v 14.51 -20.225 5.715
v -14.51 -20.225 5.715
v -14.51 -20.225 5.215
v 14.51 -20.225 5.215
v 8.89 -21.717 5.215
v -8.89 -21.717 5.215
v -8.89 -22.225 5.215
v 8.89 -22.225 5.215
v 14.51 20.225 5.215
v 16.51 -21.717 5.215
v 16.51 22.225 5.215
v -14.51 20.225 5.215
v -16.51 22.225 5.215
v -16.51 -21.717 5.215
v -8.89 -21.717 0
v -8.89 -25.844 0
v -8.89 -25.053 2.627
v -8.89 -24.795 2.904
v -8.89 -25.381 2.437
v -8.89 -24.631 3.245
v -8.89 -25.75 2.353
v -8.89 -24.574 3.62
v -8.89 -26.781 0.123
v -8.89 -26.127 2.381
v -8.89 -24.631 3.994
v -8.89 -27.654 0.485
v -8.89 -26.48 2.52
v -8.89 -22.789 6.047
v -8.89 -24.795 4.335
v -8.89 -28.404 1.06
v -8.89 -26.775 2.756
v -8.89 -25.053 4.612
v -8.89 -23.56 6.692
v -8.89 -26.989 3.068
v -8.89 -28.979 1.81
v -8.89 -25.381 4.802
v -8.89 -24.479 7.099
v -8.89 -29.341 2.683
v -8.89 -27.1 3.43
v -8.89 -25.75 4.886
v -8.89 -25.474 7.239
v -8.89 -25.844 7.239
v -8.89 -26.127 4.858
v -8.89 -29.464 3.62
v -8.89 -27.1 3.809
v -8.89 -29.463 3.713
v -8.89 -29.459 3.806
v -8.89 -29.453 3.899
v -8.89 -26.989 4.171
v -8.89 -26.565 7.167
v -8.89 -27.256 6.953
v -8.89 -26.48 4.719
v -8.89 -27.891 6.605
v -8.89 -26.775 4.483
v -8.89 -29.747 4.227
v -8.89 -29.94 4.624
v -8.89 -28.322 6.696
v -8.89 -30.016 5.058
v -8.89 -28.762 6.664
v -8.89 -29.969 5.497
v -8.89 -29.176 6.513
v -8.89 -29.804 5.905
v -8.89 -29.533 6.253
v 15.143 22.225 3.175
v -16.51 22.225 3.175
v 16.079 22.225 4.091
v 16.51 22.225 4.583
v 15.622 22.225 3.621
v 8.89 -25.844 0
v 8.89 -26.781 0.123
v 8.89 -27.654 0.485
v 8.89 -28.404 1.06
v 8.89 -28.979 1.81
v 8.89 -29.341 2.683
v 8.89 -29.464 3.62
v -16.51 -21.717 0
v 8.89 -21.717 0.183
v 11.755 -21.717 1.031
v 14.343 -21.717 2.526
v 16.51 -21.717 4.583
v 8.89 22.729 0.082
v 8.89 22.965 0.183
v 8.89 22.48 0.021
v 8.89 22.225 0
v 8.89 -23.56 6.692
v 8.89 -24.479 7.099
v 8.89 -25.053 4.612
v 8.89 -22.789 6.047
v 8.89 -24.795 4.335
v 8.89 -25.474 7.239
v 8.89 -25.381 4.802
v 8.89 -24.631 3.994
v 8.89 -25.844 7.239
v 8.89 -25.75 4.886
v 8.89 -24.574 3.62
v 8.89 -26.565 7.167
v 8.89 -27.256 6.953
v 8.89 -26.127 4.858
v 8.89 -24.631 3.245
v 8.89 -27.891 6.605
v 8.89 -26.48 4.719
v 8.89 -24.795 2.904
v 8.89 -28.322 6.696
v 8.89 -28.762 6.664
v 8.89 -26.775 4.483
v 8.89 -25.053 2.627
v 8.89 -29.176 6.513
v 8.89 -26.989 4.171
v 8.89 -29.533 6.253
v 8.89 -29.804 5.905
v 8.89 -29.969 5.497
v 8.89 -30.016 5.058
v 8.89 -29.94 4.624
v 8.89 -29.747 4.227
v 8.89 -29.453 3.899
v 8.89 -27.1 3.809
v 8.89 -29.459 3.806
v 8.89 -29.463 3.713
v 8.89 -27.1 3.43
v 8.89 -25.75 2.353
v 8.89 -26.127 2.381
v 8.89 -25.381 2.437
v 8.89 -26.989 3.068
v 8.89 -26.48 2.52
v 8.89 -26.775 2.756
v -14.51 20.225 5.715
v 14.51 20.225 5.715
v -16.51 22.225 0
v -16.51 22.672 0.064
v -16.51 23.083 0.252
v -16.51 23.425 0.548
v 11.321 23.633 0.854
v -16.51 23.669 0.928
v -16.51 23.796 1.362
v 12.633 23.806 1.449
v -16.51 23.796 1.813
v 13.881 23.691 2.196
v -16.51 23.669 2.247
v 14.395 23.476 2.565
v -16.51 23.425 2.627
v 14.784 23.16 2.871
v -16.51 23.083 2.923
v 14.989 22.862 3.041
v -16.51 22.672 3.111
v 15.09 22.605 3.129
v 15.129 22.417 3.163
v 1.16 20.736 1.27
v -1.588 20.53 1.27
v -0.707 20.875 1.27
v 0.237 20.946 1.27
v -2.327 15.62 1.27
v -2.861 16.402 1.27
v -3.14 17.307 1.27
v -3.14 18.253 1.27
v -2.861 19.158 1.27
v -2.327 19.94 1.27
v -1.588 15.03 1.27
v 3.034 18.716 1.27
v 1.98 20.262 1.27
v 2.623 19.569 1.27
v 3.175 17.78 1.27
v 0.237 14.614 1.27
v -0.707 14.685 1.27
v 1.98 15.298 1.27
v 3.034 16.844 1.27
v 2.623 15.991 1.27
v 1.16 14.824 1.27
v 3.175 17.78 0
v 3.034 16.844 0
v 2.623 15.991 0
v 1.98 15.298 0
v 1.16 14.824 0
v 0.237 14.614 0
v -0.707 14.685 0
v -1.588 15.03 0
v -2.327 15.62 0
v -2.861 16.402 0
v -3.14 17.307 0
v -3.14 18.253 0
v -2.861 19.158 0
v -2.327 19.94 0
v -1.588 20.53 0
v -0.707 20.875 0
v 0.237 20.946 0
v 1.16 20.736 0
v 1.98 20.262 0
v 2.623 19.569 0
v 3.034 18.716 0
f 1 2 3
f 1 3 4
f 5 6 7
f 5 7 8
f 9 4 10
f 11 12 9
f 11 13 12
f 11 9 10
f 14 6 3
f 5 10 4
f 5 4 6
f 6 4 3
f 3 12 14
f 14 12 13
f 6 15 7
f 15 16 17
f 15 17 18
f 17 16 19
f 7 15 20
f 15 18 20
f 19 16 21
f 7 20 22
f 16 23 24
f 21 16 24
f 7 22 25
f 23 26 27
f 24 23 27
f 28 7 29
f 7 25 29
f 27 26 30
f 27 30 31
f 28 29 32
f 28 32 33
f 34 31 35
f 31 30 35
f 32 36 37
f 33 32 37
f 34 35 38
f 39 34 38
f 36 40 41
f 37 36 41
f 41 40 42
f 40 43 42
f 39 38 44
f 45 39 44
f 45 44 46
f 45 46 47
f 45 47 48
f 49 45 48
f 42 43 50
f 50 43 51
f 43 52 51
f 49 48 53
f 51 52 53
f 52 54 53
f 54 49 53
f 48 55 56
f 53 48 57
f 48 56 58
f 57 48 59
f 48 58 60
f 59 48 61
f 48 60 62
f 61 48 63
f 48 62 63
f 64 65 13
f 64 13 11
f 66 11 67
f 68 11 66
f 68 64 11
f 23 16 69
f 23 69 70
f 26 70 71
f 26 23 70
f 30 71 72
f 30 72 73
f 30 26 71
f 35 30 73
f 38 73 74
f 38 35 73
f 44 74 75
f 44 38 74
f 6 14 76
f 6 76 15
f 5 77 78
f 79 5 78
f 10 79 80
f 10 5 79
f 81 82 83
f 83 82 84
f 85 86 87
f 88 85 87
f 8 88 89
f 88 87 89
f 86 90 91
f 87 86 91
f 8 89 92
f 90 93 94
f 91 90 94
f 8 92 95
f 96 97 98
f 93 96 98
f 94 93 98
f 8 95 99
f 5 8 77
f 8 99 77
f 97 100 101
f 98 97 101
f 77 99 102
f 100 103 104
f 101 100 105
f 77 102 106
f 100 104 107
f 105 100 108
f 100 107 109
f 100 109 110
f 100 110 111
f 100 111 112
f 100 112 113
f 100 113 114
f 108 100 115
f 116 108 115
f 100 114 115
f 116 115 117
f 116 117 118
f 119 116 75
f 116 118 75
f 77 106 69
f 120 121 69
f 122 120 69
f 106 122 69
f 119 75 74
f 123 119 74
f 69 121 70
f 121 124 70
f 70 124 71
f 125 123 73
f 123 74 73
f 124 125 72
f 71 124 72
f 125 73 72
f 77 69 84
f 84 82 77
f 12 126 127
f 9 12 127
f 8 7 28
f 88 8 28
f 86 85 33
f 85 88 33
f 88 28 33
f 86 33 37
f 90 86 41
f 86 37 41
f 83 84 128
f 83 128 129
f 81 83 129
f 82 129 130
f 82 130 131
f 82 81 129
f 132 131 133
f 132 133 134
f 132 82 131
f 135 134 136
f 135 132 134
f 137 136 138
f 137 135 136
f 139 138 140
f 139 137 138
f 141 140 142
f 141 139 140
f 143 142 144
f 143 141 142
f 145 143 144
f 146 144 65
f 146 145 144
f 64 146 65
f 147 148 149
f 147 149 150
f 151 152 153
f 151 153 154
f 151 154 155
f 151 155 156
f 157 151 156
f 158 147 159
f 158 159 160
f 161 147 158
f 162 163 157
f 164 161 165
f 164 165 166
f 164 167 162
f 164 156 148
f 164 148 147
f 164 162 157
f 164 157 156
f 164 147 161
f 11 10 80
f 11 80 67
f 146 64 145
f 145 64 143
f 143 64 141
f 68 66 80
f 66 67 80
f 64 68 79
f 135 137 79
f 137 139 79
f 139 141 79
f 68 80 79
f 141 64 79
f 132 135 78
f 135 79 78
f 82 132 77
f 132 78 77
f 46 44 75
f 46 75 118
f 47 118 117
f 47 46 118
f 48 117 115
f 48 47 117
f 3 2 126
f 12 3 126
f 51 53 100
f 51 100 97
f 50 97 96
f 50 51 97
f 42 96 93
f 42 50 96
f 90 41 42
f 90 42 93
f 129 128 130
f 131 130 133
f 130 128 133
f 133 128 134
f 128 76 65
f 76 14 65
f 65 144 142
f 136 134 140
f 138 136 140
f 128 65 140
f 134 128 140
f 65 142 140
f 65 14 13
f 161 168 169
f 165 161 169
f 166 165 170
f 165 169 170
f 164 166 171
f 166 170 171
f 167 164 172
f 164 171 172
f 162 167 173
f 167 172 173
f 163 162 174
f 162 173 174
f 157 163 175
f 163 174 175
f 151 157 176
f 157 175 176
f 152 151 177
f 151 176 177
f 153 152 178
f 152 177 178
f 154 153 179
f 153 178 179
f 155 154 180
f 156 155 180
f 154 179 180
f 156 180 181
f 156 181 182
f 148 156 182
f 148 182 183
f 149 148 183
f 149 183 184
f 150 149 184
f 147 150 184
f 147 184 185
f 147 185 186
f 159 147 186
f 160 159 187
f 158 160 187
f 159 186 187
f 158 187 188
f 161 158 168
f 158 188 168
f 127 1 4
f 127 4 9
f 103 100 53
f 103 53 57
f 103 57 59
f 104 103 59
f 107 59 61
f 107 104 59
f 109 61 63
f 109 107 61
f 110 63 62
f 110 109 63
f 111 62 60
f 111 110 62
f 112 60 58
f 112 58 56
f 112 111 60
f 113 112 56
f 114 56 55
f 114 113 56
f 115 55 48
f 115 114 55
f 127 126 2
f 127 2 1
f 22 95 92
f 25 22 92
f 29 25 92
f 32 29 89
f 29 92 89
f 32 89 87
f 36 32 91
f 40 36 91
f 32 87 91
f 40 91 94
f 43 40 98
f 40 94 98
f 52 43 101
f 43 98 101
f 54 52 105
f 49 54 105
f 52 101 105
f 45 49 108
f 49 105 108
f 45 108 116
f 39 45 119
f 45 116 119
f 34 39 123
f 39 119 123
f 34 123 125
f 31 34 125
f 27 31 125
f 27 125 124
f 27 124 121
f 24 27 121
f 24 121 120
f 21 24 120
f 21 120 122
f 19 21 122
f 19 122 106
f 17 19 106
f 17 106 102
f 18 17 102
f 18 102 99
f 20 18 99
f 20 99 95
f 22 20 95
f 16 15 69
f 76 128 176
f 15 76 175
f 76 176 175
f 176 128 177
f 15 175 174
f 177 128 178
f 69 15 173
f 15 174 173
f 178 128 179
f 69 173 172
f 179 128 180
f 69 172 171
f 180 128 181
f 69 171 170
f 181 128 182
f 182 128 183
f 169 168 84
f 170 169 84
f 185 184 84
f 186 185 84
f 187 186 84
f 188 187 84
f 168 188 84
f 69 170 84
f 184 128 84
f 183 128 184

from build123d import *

# Parameters (mm, degrees)
F0_W         = 33.02
F0_H         = 44.45
F1_DEPTH     = 5.715
F2_W         = 17.78
F2_H         = 7.239
F3_DEPTH     = 7.239
F4_R         = 1.27
F5_DEPTH     = 19.05
F6_W         = 33.02
F6_H         = 44.45
F6_W_2       = 29.02
F6_H_2       = 40.45
F7_DEPTH     = 0.5
F9_DEPTH     = 33.02
F10_T1_DEPTH = 35.8775
F10_T3_DEPTH = 34.0243528649
F11_R        = 3.175
F12_DEPTH    = 1.27
F14_DEPTH    = 17.78
F15_W        = 7.62
F15_H        = 5.215
F16_DEPTH    = 0.508
F19_DEPTH    = 76.2


# Not quite as in the source:
# - a fillet or chamfer that OpenCascade refuses, or shapes differently, is made with other operations: its cross-section is extruded or revolved along the edge and cut away or added


with BuildPart() as f1:
    # F0 (on Top) → F1 (new body)
    with BuildSketch(Plane.XY):
        Rectangle(F0_W, F0_H)
    extrude(amount=F1_DEPTH)

    # F2 (on face) → F3 (join)
    with BuildSketch(Plane.XZ.offset(22.225)):
        with Locations((0, 3.6195)):
            Rectangle(F2_W, F2_H)
    extrude(amount=F3_DEPTH)

    # F4 (on face) → F5 (cut)
    with BuildSketch(Plane.YZ.offset(8.89)):
        with Locations((-25.8445, 3.6195)):
            Circle(F4_R)
    extrude(amount=-F5_DEPTH, mode=Mode.SUBTRACT)

    # F6 (on face) → F7 (cut)
    with BuildSketch(Plane.XY.offset(5.715)):
        Rectangle(F6_W, F6_H)
        Rectangle(F6_W_2, F6_H_2, mode=Mode.SUBTRACT)
    extrude(amount=-F7_DEPTH, mode=Mode.SUBTRACT)

    # F8 (on face) → F9 (join, through all)
    with BuildSketch(Plane.YZ.offset(16.51)):
        with BuildLine():
            Line((22.225, 3.175), (22.225, 0))
            ThreePointArc((22.225, 0), (23.8125, 1.5875), (22.225, 3.175))
        make_face()
    extrude(amount=-F9_DEPTH)

    # F10: fillet of radius 3.6195 on 3 edges, made by hand

    # F10_s2 → F10_t1 (cut)
    with BuildSketch(Plane.YZ.offset(-17.93875)):
        with BuildLine():
            ThreePointArc((-29.464, 3.6195), (-28.4038729945, 6.1788729945), (-25.8445, 7.239))
            Line((-25.8445, 7.239), (-25.8445, 7.31139))
            Line((-25.8445, 7.31139), (-29.53639, 7.31139))
            Line((-29.53639, 7.31139), (-29.53639, 3.6195))
            Line((-29.53639, 3.6195), (-29.464, 3.6195))
        make_face()
        with BuildLine():
            ThreePointArc((-25.8445, 0), (-28.4038729945, 1.0601270055), (-29.464, 3.6195))
            Line((-29.464, 3.6195), (-29.53639, 3.6195))
            Line((-29.53639, 3.6195), (-29.53639, -0.07239))
            Line((-29.53639, -0.07239), (-25.8445, -0.07239))
            Line((-25.8445, -0.07239), (-25.8445, 0))
        make_face()
    extrude(amount=F10_T1_DEPTH, mode=Mode.SUBTRACT)

    # F10_s4 → F10_t3 (cut)
    with BuildSketch(Plane.YZ.offset(-17.0121764325)):
        with BuildLine():
            ThreePointArc((-22.225, 5.215), (-23.5599912664, 6.6916077862), (-25.473870573, 7.239))
            Line((-25.473870573, 7.239), (-25.473870573, 7.31139))
            Line((-25.473870573, 7.31139), (-22.225, 7.31139))
            Line((-22.225, 7.31139), (-22.15261, 7.239))
            ThreePointArc((-22.15261, 7.239), (-22.15261, 6.227), (-22.1600225885, 5.24691))
            Line((-22.1600225885, 5.24691), (-22.225, 5.215))
        make_face()
    extrude(amount=F10_T3_DEPTH, mode=Mode.SUBTRACT)

    # F11 (on face) → F12 (cut)
    with BuildSketch(Plane(origin=(0, 0, 0), x_dir=(1, 0, 0), z_dir=(0, 0, -1))):
        with Locations((0, -17.78)):
            Circle(F11_R)
    extrude(amount=-F12_DEPTH, mode=Mode.SUBTRACT)

    # F13 (on face) → F14 (join)
    with BuildSketch(Plane.YZ.offset(8.89)):
        with BuildLine():
            ThreePointArc((-29.4532143561, 3.8987148746), (-28.979078949, 5.42925), (-27.8906643526, 6.6051308701))
            ThreePointArc((-27.8906643526, 6.6051308701), (-29.8039681461, 5.9055), (-29.4532143561, 3.8987148746))
        make_face()
    extrude(amount=-F14_DEPTH)

    # F15 (on face) → F16 (cut)
    with BuildSketch(Plane.XZ.offset(22.225)):
        with Locations((-12.7, 2.6075)):
            Rectangle(F15_W, F15_H)
        with Locations((12.7, 2.6075)):
            Rectangle(F15_W, F15_H)
    extrude(amount=-F16_DEPTH, mode=Mode.SUBTRACT)

    # F18 (on face) → F19 (cut)
    with BuildSketch(Plane.XZ.offset(21.717)):
        with BuildLine():
            ThreePointArc((16.51, 4.5832213708), (13.0932734681, 1.702037729), (8.89, 0.182915771))
            Line((8.89, 0.182915771), (8.89, 0))
            Line((8.89, 0), (16.51, 0))
            Line((16.51, 0), (16.51, 4.5832213708))
        make_face()
    extrude(amount=-F19_DEPTH, mode=Mode.SUBTRACT)


solid = f1.part
